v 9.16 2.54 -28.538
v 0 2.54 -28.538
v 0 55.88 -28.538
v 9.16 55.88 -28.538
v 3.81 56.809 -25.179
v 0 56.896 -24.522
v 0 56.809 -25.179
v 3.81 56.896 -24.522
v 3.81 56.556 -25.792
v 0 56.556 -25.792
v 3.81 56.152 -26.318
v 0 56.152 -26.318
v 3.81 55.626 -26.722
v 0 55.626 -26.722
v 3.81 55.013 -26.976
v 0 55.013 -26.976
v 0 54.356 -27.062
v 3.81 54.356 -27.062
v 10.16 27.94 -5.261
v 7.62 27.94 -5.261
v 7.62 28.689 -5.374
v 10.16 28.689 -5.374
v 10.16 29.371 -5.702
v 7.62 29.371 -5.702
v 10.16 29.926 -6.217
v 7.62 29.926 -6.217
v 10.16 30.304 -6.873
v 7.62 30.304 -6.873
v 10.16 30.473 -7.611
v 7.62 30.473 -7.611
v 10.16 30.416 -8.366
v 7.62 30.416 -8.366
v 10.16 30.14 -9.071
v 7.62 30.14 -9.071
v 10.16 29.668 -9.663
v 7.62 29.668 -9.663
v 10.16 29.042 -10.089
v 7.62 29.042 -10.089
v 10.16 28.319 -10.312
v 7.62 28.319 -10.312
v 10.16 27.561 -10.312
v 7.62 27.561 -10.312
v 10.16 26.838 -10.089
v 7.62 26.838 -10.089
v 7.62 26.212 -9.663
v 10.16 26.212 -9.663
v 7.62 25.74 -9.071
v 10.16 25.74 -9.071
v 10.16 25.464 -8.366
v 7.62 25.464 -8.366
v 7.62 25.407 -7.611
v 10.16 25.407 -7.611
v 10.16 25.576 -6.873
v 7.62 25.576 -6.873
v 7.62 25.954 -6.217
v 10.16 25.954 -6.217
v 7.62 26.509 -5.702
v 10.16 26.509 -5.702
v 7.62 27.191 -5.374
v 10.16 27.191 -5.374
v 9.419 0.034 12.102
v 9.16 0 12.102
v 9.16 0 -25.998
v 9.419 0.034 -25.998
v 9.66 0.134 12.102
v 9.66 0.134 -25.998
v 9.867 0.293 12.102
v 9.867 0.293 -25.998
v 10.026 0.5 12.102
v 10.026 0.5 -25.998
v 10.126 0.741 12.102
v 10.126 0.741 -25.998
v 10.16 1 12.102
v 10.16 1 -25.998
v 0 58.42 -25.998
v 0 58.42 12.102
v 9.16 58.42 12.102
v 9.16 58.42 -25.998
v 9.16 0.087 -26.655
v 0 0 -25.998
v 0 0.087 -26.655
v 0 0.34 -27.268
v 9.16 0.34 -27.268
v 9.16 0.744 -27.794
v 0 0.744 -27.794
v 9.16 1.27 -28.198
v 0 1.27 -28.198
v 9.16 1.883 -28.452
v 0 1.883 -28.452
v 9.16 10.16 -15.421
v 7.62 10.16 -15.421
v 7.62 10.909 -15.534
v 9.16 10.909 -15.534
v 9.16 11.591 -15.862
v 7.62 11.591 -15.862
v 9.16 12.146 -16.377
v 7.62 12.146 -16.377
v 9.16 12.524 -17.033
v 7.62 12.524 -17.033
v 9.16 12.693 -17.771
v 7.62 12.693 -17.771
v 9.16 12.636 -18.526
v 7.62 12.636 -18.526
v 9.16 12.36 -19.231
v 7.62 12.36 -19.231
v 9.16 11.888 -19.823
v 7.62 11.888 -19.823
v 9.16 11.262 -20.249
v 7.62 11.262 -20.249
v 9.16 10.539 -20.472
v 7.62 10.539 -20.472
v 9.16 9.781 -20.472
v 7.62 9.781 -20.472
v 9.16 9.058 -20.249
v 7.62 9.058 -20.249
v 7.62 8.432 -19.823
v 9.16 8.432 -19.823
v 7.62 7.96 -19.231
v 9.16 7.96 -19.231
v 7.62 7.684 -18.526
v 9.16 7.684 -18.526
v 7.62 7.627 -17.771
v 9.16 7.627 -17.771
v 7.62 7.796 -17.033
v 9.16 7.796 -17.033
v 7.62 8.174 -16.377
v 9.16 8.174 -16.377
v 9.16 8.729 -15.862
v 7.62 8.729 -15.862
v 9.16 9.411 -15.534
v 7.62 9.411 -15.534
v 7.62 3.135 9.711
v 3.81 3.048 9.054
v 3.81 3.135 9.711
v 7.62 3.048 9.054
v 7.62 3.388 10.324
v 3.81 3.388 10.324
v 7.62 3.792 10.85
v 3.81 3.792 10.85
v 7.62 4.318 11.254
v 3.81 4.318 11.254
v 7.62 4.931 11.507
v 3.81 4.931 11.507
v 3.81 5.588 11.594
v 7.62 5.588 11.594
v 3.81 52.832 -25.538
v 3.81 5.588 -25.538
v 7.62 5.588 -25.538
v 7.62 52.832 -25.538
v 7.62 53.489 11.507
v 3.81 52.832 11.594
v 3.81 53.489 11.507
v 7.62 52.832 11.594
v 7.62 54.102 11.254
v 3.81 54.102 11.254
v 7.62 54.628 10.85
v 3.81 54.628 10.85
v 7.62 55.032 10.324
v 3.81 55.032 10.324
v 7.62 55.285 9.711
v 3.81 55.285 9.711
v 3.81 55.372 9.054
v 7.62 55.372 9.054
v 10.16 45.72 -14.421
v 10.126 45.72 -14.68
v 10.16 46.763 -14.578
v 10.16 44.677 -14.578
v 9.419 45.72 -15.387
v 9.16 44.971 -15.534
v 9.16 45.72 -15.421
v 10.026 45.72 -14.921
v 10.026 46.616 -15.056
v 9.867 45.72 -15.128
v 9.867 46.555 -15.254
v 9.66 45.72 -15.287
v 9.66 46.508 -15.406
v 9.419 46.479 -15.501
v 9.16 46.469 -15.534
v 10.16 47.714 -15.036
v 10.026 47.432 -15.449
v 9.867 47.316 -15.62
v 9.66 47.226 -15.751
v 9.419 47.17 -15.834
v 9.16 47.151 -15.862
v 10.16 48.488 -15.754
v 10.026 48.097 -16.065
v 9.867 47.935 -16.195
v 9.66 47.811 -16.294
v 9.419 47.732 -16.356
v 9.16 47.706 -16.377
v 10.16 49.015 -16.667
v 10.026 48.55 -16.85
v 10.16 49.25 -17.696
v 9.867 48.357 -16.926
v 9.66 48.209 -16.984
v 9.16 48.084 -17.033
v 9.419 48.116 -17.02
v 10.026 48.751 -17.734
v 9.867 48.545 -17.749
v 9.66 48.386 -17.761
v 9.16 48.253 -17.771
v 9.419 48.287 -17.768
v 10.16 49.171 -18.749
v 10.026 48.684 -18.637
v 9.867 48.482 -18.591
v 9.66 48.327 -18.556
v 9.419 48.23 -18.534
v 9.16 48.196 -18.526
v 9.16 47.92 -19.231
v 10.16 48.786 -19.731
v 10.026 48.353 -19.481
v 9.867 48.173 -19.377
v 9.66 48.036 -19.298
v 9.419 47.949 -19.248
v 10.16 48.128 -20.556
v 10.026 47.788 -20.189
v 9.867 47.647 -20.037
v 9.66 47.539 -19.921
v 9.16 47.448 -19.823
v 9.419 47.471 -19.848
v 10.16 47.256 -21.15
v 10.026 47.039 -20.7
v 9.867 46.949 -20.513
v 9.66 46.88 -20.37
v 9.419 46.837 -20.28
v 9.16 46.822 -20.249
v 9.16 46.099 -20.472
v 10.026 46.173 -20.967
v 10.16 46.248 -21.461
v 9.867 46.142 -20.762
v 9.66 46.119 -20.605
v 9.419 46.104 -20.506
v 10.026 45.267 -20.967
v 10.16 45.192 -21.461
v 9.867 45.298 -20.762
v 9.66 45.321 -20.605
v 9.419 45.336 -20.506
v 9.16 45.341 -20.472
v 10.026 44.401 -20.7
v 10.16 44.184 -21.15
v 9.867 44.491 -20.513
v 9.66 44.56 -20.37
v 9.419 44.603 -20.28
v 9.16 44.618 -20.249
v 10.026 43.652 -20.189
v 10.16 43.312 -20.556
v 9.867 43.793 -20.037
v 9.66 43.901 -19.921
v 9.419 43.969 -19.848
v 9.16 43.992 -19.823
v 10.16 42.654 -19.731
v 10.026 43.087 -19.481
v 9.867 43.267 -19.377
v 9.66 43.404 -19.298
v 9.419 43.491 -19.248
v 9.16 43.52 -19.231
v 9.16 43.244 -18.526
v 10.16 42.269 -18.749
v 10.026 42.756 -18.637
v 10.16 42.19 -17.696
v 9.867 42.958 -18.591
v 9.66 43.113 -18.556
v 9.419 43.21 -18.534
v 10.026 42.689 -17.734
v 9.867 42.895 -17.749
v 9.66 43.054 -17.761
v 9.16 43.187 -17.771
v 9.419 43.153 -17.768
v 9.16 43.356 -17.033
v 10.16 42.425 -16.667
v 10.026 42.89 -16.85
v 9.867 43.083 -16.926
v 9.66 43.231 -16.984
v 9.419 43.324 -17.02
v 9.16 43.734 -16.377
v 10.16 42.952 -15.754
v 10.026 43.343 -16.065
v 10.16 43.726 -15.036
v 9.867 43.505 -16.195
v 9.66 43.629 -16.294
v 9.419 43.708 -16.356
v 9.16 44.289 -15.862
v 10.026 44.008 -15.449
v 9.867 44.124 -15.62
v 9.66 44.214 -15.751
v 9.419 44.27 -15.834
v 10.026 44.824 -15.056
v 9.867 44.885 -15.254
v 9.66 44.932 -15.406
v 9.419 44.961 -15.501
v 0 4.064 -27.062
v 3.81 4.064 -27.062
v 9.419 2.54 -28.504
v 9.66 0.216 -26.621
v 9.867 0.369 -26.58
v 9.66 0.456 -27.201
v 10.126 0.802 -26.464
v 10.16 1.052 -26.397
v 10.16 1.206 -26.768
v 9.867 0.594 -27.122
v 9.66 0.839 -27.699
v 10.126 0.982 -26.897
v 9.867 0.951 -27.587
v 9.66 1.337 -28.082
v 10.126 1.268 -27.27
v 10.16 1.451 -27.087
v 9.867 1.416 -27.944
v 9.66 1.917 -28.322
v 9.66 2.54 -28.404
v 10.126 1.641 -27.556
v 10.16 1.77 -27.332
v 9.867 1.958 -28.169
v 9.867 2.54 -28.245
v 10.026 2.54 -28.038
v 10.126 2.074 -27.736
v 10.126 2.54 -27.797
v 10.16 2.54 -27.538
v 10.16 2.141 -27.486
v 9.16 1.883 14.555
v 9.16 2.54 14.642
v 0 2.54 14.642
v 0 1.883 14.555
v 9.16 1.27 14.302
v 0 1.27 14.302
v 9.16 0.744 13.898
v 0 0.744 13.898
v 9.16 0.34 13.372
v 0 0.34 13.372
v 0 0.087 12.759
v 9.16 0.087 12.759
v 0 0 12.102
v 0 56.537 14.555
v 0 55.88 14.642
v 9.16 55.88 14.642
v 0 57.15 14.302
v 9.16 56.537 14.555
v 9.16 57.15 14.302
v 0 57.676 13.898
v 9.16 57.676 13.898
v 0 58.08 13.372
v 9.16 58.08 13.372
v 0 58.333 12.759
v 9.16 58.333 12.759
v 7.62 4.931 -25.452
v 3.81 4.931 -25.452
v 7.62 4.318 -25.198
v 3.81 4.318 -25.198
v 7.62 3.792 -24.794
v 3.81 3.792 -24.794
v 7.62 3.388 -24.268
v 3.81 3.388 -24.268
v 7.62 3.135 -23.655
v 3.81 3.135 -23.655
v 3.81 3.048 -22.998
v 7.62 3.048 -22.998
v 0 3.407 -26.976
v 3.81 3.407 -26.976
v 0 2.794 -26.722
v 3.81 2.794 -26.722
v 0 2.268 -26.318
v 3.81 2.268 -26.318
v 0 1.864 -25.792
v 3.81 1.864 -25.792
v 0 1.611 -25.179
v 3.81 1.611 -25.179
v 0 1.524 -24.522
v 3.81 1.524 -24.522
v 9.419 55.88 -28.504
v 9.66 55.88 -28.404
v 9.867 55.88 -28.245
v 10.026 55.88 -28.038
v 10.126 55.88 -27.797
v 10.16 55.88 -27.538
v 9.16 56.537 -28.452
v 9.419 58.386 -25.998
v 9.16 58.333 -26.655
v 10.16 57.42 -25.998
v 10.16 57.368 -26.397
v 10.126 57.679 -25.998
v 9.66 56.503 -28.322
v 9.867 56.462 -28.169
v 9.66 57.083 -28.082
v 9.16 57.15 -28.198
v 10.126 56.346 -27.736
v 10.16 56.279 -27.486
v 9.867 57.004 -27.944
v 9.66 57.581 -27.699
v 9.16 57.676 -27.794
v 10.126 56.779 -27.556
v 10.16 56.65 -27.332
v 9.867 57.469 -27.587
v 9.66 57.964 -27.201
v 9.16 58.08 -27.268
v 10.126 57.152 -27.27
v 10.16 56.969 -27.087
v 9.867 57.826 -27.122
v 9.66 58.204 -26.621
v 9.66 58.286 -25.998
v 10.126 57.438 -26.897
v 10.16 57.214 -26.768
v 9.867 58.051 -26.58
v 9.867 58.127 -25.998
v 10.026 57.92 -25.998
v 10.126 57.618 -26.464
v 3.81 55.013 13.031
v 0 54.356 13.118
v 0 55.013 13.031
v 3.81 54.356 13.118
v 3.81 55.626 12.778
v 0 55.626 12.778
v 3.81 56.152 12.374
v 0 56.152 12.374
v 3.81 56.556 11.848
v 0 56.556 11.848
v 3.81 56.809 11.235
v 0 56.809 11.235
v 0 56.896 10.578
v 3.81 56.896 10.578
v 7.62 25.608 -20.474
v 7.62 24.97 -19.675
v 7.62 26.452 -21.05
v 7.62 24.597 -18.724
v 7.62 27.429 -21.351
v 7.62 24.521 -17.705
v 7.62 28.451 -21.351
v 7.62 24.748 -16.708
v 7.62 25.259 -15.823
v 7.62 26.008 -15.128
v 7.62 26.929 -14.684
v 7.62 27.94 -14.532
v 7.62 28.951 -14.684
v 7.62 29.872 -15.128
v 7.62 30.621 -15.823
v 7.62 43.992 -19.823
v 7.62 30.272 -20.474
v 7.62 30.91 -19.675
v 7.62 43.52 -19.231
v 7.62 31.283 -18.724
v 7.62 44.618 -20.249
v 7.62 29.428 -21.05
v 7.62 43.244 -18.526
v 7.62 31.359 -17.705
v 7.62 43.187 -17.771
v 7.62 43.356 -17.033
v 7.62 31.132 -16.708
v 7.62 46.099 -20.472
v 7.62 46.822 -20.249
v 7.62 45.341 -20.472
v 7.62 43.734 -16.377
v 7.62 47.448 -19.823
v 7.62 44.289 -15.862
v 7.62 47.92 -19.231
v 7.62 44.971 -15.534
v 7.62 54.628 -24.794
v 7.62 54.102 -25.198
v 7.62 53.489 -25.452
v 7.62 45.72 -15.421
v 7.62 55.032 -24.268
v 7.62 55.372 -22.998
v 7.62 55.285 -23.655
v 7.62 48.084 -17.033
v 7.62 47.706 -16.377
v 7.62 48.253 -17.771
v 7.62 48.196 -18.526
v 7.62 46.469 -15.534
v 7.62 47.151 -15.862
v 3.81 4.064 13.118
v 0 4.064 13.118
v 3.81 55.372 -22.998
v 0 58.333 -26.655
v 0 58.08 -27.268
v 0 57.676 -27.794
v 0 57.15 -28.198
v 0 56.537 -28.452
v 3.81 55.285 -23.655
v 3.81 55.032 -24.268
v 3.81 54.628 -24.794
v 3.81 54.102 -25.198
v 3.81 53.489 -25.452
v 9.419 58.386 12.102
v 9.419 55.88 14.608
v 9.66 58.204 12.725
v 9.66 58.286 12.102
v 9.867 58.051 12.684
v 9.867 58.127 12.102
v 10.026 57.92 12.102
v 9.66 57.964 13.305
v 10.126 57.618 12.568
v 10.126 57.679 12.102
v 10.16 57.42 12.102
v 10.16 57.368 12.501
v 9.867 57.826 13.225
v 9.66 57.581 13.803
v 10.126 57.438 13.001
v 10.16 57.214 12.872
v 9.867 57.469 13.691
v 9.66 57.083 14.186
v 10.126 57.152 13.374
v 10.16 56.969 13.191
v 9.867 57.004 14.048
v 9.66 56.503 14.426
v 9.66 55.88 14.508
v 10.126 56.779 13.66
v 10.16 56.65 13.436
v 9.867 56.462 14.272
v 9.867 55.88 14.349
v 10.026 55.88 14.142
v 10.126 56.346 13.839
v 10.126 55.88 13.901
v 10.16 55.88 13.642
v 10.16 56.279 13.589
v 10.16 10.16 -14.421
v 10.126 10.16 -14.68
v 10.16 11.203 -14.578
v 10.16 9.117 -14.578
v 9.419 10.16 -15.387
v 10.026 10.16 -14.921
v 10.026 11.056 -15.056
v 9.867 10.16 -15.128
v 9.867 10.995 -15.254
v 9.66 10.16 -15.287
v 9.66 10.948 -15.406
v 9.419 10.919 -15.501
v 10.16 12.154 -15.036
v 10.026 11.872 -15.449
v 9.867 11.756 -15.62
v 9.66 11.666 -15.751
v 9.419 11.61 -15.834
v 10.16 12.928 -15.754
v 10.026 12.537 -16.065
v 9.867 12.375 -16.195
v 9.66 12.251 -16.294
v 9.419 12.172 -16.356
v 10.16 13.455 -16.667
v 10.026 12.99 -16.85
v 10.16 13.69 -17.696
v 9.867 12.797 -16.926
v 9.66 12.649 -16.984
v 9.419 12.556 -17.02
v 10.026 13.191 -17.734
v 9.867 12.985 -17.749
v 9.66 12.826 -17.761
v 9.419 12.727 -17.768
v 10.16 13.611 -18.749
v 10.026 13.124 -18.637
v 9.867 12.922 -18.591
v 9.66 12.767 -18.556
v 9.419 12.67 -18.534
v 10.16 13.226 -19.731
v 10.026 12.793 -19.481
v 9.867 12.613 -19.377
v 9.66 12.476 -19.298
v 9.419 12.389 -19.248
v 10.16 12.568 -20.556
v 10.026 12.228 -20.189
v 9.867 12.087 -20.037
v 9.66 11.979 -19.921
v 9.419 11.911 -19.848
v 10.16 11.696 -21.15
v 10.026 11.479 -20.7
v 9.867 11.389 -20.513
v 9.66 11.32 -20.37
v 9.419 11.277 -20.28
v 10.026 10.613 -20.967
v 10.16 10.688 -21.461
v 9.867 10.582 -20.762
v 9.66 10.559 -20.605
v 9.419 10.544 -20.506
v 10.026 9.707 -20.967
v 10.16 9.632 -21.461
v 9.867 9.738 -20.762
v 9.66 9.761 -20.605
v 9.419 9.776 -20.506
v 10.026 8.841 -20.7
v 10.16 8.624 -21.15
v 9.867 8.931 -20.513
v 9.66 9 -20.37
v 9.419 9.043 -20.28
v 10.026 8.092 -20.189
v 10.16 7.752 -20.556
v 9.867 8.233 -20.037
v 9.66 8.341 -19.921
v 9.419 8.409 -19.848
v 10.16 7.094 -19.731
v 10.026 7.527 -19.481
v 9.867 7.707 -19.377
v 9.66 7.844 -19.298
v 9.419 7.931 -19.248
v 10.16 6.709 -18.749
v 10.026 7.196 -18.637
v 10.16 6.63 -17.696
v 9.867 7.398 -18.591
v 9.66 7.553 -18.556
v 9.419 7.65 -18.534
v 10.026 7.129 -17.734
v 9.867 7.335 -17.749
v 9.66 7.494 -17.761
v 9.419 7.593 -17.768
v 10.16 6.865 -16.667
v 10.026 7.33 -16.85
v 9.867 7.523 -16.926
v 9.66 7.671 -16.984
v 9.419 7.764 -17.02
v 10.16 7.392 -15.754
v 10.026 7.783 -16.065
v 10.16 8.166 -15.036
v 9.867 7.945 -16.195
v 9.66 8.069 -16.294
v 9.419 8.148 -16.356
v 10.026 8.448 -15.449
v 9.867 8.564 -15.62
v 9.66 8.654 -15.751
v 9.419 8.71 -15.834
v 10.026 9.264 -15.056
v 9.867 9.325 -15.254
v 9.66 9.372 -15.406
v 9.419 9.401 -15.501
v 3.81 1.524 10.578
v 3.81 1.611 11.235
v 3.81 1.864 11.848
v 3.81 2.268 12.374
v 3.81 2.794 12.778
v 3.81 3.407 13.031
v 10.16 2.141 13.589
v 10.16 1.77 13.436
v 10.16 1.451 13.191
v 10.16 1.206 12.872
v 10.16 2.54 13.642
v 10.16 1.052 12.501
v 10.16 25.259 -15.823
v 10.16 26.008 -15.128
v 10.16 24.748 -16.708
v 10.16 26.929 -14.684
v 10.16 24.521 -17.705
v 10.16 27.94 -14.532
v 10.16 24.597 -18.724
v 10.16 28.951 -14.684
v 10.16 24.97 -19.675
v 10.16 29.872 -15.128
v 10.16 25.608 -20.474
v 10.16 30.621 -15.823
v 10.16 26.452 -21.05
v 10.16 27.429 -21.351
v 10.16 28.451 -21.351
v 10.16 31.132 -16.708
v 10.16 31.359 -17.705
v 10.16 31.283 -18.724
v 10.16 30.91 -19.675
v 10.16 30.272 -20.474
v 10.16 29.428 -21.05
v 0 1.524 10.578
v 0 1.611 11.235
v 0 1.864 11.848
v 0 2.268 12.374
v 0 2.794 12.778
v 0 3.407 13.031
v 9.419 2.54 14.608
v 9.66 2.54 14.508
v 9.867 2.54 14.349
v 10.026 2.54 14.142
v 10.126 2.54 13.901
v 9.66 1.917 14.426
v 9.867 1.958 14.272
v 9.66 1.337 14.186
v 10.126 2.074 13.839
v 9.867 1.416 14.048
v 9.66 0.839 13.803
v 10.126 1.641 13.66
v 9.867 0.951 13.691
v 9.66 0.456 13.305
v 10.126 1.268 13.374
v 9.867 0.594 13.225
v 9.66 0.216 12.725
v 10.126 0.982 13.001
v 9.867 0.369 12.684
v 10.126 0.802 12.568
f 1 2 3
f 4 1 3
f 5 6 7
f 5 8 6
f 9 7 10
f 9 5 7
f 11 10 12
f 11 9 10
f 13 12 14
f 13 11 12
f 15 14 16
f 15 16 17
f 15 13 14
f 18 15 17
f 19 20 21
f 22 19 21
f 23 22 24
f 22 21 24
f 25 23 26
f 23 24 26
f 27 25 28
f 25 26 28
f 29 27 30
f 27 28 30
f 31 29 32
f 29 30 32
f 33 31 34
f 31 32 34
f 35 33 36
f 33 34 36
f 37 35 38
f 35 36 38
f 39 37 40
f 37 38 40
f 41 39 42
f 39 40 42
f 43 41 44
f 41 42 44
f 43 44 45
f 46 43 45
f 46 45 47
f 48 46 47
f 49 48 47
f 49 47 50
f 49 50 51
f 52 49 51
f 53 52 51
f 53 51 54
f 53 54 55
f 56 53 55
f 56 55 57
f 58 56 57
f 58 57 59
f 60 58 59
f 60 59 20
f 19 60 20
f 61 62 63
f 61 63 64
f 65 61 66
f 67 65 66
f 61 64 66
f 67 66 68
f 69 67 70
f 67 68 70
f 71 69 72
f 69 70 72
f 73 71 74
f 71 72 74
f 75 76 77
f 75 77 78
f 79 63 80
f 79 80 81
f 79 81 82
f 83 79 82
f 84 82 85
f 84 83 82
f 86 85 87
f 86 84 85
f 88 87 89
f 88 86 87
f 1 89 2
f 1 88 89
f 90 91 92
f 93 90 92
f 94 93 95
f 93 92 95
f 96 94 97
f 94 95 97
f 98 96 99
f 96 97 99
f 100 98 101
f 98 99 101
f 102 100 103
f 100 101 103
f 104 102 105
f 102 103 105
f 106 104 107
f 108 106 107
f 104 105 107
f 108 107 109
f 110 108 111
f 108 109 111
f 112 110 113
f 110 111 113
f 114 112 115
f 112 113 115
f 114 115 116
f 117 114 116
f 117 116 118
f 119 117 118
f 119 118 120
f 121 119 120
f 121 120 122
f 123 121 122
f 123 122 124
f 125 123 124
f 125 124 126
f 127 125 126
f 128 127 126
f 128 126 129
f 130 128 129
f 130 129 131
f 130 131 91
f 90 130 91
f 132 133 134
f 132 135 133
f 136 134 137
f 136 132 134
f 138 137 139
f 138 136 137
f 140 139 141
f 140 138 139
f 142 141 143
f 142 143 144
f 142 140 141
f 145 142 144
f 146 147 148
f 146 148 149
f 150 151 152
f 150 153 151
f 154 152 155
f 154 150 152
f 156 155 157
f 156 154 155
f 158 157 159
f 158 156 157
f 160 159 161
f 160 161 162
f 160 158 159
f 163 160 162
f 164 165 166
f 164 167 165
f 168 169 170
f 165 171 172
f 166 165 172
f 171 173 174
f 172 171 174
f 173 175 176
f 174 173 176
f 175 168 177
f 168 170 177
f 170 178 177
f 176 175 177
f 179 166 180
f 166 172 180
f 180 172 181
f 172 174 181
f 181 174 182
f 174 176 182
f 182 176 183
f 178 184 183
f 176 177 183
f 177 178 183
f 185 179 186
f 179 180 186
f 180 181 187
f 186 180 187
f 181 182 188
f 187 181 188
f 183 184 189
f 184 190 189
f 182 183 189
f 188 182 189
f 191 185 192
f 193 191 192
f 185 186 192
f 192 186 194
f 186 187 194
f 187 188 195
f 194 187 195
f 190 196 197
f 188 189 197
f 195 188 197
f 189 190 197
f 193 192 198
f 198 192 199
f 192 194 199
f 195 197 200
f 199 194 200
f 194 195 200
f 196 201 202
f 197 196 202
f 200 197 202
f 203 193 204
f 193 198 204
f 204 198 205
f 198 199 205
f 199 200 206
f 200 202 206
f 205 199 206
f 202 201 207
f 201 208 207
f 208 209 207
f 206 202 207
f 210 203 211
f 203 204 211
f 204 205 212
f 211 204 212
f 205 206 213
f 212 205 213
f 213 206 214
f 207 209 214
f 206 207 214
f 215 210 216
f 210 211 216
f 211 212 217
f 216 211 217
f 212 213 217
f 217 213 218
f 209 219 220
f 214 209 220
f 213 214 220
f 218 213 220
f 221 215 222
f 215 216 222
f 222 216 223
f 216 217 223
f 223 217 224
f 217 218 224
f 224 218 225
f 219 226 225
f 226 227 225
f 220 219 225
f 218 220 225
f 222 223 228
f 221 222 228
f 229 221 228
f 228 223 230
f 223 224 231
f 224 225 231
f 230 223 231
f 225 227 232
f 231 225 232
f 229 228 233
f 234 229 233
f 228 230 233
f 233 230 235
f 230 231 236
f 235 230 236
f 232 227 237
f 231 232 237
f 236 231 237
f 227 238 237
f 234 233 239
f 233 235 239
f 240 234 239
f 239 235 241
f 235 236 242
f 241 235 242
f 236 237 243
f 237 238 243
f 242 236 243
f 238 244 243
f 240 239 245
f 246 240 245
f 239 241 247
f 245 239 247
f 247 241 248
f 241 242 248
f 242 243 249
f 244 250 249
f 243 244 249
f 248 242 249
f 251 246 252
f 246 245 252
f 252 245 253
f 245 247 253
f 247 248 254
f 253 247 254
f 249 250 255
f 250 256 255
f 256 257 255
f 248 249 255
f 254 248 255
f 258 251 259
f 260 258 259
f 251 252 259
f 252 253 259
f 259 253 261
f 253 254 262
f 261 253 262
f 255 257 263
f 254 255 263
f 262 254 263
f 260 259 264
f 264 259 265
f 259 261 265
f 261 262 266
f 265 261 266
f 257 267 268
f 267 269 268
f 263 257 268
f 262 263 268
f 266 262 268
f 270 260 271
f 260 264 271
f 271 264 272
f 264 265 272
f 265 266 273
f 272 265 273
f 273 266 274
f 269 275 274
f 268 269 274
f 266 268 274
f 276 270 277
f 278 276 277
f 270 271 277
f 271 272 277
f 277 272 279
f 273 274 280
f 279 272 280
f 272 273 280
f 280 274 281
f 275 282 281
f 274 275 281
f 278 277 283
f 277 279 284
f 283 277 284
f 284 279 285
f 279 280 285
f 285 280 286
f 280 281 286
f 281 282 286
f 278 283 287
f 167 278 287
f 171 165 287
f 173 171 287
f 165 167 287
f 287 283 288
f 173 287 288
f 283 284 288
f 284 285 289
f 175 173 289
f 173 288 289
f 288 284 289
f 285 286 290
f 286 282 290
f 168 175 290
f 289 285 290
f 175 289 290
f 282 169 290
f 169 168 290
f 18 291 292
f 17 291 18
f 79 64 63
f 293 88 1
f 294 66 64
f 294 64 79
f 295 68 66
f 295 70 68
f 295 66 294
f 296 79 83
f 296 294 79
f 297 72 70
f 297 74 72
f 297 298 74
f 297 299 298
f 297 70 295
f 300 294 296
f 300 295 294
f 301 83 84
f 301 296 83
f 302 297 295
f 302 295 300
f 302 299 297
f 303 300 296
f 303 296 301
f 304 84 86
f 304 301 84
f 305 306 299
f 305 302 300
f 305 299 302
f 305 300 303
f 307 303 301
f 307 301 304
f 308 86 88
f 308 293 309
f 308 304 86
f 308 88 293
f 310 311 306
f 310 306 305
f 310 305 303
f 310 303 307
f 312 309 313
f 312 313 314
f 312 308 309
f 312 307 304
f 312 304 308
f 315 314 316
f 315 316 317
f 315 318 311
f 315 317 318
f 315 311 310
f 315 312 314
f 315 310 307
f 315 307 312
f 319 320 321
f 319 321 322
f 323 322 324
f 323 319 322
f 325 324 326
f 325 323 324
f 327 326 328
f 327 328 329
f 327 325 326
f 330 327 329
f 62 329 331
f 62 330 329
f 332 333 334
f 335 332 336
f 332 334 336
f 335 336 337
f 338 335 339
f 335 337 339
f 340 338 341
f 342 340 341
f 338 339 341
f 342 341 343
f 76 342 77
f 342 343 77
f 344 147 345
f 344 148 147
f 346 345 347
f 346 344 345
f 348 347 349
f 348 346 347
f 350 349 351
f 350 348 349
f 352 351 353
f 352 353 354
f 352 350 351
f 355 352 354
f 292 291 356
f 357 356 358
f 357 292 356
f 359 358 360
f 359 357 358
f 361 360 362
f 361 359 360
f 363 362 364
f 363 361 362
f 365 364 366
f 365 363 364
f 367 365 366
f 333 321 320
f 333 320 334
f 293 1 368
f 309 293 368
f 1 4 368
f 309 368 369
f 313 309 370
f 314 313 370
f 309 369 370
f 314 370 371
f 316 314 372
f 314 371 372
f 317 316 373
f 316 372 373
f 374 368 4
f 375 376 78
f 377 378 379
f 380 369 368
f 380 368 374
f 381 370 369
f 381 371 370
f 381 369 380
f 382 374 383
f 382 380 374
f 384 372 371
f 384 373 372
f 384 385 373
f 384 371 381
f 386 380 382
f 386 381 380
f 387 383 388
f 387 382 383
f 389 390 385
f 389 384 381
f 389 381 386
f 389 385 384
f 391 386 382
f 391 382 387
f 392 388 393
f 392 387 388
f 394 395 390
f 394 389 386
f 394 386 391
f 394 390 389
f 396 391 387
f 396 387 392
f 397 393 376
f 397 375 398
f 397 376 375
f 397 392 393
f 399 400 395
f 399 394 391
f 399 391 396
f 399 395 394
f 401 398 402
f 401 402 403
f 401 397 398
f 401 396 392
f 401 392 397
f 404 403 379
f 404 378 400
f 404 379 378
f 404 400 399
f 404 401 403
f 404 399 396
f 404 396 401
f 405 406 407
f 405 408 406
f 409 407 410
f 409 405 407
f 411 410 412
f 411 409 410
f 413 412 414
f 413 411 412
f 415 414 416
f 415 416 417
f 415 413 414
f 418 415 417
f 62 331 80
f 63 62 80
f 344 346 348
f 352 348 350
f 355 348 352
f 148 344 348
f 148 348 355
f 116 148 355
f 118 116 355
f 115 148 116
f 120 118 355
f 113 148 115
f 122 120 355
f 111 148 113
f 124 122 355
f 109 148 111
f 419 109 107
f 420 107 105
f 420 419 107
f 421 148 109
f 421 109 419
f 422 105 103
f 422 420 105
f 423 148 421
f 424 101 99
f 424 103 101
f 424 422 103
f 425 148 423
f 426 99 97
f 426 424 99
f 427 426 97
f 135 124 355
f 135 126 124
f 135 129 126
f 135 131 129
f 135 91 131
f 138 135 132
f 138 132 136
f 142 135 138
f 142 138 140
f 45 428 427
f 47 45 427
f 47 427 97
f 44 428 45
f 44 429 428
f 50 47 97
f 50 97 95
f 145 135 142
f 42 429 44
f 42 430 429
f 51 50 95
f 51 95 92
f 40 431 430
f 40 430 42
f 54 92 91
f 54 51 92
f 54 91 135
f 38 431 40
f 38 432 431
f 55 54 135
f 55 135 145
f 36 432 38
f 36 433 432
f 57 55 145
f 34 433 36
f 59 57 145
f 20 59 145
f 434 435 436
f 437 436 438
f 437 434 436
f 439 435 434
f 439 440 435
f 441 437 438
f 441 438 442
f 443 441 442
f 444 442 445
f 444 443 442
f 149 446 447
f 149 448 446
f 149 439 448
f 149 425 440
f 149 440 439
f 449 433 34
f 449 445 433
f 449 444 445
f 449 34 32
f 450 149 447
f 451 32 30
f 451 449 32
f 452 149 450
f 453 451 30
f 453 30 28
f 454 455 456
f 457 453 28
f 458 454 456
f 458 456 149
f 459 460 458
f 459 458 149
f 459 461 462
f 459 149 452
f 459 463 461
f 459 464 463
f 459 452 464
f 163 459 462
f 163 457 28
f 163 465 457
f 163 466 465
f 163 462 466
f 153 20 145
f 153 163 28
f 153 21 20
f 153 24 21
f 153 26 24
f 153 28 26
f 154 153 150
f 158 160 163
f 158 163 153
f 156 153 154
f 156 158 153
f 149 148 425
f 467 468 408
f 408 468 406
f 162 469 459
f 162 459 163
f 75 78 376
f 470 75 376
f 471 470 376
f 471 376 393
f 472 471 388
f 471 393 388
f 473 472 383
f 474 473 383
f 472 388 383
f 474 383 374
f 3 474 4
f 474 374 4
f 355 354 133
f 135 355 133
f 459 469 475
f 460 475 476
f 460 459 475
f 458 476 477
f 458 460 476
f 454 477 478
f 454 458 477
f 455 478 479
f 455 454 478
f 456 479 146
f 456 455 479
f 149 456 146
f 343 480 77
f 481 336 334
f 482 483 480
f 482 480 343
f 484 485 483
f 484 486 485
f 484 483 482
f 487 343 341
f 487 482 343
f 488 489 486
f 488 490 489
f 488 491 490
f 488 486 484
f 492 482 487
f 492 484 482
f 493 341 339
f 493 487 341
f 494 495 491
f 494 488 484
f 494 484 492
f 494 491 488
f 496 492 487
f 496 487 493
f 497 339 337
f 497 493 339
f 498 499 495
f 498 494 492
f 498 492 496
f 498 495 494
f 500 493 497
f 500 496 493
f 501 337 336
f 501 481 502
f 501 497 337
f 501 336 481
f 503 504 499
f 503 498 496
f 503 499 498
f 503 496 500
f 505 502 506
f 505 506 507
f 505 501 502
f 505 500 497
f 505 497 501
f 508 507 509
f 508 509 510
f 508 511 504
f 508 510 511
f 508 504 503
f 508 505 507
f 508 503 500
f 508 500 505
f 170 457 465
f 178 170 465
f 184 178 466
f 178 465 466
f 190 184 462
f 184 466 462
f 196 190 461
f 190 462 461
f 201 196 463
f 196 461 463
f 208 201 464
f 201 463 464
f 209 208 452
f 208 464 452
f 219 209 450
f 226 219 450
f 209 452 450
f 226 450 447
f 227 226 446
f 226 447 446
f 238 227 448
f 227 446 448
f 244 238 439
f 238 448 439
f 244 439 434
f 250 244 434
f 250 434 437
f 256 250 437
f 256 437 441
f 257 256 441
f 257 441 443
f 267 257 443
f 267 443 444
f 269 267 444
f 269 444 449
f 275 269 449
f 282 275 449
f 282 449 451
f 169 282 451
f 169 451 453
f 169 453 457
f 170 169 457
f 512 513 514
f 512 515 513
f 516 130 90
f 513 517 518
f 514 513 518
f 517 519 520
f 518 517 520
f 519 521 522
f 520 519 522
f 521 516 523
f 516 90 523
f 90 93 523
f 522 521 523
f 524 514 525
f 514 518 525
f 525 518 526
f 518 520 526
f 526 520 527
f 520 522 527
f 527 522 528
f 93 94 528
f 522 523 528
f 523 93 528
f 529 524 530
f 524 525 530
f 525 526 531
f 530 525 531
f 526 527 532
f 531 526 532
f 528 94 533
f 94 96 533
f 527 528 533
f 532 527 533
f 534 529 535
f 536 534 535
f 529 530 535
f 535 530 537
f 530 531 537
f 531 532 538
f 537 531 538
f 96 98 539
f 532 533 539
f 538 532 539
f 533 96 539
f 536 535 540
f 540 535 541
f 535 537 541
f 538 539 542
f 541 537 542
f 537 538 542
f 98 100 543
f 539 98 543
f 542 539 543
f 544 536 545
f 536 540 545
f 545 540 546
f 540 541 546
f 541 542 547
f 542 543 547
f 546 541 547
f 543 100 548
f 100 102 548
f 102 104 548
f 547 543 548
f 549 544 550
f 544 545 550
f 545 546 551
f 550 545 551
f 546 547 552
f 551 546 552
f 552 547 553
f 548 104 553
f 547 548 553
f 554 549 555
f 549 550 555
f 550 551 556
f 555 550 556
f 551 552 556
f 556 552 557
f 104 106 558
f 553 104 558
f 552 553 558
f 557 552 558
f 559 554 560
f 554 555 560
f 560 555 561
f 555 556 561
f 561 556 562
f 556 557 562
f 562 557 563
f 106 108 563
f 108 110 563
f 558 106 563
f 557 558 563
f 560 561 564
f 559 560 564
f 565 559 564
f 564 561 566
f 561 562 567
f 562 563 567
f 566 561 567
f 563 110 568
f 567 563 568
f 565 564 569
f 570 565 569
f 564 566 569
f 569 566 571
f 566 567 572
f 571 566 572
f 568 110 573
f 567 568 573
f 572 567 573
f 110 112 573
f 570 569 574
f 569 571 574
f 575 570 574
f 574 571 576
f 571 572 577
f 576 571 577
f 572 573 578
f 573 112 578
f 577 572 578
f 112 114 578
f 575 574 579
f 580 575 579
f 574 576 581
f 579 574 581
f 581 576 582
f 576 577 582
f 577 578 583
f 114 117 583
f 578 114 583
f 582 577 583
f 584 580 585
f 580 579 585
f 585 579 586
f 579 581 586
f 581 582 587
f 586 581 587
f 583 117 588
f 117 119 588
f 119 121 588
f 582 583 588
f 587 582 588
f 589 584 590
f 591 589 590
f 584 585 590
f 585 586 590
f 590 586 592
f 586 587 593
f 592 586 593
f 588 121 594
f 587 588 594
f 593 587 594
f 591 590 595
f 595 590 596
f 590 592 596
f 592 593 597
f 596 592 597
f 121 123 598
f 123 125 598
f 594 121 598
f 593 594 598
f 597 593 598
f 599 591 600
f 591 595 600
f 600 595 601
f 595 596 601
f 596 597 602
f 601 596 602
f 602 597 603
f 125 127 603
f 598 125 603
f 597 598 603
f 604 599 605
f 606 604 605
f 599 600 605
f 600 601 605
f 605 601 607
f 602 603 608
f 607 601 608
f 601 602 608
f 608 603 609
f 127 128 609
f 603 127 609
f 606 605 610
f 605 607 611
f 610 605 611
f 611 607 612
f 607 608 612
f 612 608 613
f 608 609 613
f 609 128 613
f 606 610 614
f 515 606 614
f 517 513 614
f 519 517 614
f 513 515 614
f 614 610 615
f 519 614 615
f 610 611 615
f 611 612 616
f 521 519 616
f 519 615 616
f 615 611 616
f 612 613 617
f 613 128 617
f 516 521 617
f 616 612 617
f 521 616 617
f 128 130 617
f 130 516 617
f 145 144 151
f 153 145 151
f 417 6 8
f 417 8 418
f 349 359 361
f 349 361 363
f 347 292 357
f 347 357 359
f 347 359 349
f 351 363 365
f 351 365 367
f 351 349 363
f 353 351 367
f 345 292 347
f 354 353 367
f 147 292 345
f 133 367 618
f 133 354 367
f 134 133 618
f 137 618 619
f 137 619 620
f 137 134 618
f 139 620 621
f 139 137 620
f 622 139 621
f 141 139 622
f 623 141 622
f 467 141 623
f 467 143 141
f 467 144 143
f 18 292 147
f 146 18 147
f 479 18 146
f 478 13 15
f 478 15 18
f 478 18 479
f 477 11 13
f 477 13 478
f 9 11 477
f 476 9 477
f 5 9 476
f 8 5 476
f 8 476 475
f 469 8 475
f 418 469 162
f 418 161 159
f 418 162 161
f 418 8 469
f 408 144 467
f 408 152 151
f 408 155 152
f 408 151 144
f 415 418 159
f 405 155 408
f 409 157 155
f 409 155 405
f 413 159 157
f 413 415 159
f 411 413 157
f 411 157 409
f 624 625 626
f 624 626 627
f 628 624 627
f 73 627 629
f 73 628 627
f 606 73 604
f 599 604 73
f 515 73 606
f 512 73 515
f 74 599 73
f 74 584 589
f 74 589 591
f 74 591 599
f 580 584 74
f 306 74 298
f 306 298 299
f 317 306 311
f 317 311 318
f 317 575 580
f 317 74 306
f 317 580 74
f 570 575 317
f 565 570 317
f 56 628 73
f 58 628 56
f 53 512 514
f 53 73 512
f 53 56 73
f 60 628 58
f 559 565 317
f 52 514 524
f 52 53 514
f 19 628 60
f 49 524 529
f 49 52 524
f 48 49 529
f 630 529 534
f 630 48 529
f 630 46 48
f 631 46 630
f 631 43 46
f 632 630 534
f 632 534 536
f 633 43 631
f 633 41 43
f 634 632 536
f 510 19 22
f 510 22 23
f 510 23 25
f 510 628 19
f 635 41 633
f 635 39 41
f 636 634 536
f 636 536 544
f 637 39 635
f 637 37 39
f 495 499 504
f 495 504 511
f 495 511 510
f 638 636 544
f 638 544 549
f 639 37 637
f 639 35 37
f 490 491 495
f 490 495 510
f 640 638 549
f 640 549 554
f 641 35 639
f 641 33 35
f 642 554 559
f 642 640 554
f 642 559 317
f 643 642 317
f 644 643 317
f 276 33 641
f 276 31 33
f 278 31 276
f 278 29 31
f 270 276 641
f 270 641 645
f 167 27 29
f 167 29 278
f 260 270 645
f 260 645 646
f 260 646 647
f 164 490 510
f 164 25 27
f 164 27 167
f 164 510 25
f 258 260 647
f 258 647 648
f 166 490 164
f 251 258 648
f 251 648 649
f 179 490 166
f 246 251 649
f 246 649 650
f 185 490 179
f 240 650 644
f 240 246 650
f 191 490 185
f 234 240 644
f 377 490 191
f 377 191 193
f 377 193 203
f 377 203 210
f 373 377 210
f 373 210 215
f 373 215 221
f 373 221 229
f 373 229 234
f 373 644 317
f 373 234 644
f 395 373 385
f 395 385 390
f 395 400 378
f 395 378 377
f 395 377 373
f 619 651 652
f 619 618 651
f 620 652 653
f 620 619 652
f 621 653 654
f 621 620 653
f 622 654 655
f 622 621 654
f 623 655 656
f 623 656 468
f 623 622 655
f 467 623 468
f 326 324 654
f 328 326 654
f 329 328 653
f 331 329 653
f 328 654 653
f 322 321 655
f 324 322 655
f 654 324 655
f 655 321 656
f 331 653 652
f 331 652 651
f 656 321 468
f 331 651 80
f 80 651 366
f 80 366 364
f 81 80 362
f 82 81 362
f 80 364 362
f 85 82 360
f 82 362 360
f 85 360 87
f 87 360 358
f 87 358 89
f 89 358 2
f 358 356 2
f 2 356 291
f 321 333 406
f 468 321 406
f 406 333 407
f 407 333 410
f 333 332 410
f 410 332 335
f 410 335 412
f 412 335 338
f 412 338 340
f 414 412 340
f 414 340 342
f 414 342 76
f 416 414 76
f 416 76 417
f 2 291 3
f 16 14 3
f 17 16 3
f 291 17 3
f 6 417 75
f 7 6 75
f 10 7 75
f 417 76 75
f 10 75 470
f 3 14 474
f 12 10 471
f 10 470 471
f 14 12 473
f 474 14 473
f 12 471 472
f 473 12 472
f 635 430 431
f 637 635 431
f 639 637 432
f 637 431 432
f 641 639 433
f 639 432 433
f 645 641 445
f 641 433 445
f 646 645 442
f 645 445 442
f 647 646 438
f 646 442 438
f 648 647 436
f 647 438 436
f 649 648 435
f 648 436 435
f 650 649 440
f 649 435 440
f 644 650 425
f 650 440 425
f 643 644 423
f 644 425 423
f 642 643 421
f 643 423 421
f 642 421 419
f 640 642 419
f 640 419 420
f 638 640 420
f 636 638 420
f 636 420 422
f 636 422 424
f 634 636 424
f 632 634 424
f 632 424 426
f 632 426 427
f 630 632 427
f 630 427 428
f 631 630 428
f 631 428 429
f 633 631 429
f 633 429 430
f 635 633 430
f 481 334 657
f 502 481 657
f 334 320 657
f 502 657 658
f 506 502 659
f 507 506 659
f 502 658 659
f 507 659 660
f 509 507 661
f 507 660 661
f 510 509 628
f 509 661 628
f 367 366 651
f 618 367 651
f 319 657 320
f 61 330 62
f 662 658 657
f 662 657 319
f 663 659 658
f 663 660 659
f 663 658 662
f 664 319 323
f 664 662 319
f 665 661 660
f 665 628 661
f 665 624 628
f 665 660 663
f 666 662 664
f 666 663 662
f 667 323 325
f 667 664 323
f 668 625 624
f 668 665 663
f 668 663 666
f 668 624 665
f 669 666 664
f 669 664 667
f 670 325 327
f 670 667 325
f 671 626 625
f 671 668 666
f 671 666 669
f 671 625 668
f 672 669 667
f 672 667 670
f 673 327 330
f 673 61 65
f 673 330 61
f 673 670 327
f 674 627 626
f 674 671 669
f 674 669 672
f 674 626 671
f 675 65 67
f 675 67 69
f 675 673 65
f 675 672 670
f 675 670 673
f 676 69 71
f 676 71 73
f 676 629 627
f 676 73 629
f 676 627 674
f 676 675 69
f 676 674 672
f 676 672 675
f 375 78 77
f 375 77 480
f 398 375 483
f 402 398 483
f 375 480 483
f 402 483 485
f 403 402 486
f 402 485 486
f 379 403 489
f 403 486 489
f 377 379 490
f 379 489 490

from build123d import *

# Parameters (mm, degrees)
SKETCH1_W           = 43.18
SKETCH1_H           = 58.42
BOSS_EXTRUDE1_DEPTH = 10.16
SKETCH2_R           = 2.54
SKETCH2_R_2         = 3.429
CUT_EXTRUDE2_DEPTH  = 66.806860754
SKETCH3_W           = 37.132
SKETCH3_H           = 52.324
CUT_EXTRUDE3_DEPTH  = 7.62
SKETCH4_W           = 40.18
SKETCH4_H           = 55.372
CUT_EXTRUDE4_DEPTH  = 3.81
FILLET1_R           = 2.54
FILLET2_R           = 2.54
FILLET3_R           = 2.54
FILLET4_R           = 2.54
FILLET5_R           = 2.54
FILLET6_R           = 1
FILLET7_R           = 1
FILLET8_R           = 1


with BuildPart() as part:
    # Sketch1 → Boss-Extrude1 (new body)
    with BuildSketch(Plane(origin=(0, 0, 0), x_dir=(0, 0, -1), z_dir=(1, 0, 0))):
        with Locations((6.948060942, 29.21)):
            Rectangle(SKETCH1_W, SKETCH1_H)
    extrude(amount=BOSS_EXTRUDE1_DEPTH)

    # Sketch2 → Cut-Extrude2 (cut, through all)
    with BuildSketch(Plane.ZY):
        with Locations((-17.960793947, 10.16)):
            Circle(SKETCH2_R)
        with Locations((-17.960793947, 45.72)):
            Circle(SKETCH2_R)
        with Locations((-17.960793947, 27.94)):
            Circle(SKETCH2_R_2)
        with Locations((-7.800793947, 27.94)):
            Circle(SKETCH2_R)
    extrude(amount=-CUT_EXTRUDE2_DEPTH, mode=Mode.SUBTRACT)

    # Sketch3 → Cut-Extrude3 (cut)
    with BuildSketch(Plane.ZY):
        with Locations((-6.972060942, 29.21)):
            Rectangle(SKETCH3_W, SKETCH3_H)
    extrude(amount=-CUT_EXTRUDE3_DEPTH, mode=Mode.SUBTRACT)

    # Sketch4 → Cut-Extrude4 (cut)
    with BuildSketch(Plane.ZY):
        with Locations((-6.972060942, 29.21)):
            Rectangle(SKETCH4_W, SKETCH4_H)
    extrude(amount=-CUT_EXTRUDE4_DEPTH, mode=Mode.SUBTRACT)

    # Fillet1
    fillet1_edges = [part.edges().sort_by_distance(p)[0] for p in [
        (5.715, 3.048, -25.538060942),
        (1.905, 1.524, -27.062060942),
    ]]
    fillet(fillet1_edges, radius=FILLET1_R)

    # Fillet2
    fillet2_edges = [part.edges().sort_by_distance(p)[0] for p in [
        (5.715, 3.048, 11.593939058),
        (1.905, 1.524, 13.117939058),
    ]]
    fillet(fillet2_edges, radius=FILLET2_R)

    # Fillet3
    fillet3_edges = [part.edges().sort_by_distance(p)[0] for p in [
        (5.715, 55.372, 11.593939058),
        (1.905, 56.896, 13.117939058),
    ]]
    fillet(fillet3_edges, radius=FILLET3_R)

    # Fillet4
    fillet4_edges = [part.edges().sort_by_distance(p)[0] for p in [
        (5.715, 55.372, -25.538060942),
        (1.905, 56.896, -27.062060942),
    ]]
    fillet(fillet4_edges, radius=FILLET4_R)

    # Fillet5
    fillet5_edges = [part.edges().sort_by_distance(p)[0] for p in [
        (5.08, 58.42, 14.641939058),
        (5.08, 58.42, -28.538060942),
        (5.08, 0, -28.538060942),
        (5.08, 0, 14.641939058),
    ]]
    fillet(fillet5_edges, radius=FILLET5_R)

    # Fillet6
    fillet6_edges = [part.edges().sort_by_distance(p)[0] for p in [
        (10.16, 29.21, -28.538060942),
        (10.16, 0, -6.948060942),
        (10.16, 29.21, 14.641939058),
        (10.16, 58.42, -6.948060942),
        (10.16, 57.676051224, 13.897990282),
        (10.16, 57.676051224, -27.794112166),
        (10.16, 0.743948776, 13.897990282),
        (10.16, 0.743948776, -27.794112166),
    ]]
    fillet(fillet6_edges, radius=FILLET6_R)

    # Fillet7
    fillet7_edges = [part.edges().sort_by_distance(p)[0] for p in [
        (10.16, 45.72, -20.500793947),
    ]]
    fillet(fillet7_edges, radius=FILLET7_R)

    # Fillet8
    fillet8_edges = [part.edges().sort_by_distance(p)[0] for p in [
        (10.16, 10.16, -20.500793947),
    ]]
    fillet(fillet8_edges, radius=FILLET8_R)


solid = part.part
